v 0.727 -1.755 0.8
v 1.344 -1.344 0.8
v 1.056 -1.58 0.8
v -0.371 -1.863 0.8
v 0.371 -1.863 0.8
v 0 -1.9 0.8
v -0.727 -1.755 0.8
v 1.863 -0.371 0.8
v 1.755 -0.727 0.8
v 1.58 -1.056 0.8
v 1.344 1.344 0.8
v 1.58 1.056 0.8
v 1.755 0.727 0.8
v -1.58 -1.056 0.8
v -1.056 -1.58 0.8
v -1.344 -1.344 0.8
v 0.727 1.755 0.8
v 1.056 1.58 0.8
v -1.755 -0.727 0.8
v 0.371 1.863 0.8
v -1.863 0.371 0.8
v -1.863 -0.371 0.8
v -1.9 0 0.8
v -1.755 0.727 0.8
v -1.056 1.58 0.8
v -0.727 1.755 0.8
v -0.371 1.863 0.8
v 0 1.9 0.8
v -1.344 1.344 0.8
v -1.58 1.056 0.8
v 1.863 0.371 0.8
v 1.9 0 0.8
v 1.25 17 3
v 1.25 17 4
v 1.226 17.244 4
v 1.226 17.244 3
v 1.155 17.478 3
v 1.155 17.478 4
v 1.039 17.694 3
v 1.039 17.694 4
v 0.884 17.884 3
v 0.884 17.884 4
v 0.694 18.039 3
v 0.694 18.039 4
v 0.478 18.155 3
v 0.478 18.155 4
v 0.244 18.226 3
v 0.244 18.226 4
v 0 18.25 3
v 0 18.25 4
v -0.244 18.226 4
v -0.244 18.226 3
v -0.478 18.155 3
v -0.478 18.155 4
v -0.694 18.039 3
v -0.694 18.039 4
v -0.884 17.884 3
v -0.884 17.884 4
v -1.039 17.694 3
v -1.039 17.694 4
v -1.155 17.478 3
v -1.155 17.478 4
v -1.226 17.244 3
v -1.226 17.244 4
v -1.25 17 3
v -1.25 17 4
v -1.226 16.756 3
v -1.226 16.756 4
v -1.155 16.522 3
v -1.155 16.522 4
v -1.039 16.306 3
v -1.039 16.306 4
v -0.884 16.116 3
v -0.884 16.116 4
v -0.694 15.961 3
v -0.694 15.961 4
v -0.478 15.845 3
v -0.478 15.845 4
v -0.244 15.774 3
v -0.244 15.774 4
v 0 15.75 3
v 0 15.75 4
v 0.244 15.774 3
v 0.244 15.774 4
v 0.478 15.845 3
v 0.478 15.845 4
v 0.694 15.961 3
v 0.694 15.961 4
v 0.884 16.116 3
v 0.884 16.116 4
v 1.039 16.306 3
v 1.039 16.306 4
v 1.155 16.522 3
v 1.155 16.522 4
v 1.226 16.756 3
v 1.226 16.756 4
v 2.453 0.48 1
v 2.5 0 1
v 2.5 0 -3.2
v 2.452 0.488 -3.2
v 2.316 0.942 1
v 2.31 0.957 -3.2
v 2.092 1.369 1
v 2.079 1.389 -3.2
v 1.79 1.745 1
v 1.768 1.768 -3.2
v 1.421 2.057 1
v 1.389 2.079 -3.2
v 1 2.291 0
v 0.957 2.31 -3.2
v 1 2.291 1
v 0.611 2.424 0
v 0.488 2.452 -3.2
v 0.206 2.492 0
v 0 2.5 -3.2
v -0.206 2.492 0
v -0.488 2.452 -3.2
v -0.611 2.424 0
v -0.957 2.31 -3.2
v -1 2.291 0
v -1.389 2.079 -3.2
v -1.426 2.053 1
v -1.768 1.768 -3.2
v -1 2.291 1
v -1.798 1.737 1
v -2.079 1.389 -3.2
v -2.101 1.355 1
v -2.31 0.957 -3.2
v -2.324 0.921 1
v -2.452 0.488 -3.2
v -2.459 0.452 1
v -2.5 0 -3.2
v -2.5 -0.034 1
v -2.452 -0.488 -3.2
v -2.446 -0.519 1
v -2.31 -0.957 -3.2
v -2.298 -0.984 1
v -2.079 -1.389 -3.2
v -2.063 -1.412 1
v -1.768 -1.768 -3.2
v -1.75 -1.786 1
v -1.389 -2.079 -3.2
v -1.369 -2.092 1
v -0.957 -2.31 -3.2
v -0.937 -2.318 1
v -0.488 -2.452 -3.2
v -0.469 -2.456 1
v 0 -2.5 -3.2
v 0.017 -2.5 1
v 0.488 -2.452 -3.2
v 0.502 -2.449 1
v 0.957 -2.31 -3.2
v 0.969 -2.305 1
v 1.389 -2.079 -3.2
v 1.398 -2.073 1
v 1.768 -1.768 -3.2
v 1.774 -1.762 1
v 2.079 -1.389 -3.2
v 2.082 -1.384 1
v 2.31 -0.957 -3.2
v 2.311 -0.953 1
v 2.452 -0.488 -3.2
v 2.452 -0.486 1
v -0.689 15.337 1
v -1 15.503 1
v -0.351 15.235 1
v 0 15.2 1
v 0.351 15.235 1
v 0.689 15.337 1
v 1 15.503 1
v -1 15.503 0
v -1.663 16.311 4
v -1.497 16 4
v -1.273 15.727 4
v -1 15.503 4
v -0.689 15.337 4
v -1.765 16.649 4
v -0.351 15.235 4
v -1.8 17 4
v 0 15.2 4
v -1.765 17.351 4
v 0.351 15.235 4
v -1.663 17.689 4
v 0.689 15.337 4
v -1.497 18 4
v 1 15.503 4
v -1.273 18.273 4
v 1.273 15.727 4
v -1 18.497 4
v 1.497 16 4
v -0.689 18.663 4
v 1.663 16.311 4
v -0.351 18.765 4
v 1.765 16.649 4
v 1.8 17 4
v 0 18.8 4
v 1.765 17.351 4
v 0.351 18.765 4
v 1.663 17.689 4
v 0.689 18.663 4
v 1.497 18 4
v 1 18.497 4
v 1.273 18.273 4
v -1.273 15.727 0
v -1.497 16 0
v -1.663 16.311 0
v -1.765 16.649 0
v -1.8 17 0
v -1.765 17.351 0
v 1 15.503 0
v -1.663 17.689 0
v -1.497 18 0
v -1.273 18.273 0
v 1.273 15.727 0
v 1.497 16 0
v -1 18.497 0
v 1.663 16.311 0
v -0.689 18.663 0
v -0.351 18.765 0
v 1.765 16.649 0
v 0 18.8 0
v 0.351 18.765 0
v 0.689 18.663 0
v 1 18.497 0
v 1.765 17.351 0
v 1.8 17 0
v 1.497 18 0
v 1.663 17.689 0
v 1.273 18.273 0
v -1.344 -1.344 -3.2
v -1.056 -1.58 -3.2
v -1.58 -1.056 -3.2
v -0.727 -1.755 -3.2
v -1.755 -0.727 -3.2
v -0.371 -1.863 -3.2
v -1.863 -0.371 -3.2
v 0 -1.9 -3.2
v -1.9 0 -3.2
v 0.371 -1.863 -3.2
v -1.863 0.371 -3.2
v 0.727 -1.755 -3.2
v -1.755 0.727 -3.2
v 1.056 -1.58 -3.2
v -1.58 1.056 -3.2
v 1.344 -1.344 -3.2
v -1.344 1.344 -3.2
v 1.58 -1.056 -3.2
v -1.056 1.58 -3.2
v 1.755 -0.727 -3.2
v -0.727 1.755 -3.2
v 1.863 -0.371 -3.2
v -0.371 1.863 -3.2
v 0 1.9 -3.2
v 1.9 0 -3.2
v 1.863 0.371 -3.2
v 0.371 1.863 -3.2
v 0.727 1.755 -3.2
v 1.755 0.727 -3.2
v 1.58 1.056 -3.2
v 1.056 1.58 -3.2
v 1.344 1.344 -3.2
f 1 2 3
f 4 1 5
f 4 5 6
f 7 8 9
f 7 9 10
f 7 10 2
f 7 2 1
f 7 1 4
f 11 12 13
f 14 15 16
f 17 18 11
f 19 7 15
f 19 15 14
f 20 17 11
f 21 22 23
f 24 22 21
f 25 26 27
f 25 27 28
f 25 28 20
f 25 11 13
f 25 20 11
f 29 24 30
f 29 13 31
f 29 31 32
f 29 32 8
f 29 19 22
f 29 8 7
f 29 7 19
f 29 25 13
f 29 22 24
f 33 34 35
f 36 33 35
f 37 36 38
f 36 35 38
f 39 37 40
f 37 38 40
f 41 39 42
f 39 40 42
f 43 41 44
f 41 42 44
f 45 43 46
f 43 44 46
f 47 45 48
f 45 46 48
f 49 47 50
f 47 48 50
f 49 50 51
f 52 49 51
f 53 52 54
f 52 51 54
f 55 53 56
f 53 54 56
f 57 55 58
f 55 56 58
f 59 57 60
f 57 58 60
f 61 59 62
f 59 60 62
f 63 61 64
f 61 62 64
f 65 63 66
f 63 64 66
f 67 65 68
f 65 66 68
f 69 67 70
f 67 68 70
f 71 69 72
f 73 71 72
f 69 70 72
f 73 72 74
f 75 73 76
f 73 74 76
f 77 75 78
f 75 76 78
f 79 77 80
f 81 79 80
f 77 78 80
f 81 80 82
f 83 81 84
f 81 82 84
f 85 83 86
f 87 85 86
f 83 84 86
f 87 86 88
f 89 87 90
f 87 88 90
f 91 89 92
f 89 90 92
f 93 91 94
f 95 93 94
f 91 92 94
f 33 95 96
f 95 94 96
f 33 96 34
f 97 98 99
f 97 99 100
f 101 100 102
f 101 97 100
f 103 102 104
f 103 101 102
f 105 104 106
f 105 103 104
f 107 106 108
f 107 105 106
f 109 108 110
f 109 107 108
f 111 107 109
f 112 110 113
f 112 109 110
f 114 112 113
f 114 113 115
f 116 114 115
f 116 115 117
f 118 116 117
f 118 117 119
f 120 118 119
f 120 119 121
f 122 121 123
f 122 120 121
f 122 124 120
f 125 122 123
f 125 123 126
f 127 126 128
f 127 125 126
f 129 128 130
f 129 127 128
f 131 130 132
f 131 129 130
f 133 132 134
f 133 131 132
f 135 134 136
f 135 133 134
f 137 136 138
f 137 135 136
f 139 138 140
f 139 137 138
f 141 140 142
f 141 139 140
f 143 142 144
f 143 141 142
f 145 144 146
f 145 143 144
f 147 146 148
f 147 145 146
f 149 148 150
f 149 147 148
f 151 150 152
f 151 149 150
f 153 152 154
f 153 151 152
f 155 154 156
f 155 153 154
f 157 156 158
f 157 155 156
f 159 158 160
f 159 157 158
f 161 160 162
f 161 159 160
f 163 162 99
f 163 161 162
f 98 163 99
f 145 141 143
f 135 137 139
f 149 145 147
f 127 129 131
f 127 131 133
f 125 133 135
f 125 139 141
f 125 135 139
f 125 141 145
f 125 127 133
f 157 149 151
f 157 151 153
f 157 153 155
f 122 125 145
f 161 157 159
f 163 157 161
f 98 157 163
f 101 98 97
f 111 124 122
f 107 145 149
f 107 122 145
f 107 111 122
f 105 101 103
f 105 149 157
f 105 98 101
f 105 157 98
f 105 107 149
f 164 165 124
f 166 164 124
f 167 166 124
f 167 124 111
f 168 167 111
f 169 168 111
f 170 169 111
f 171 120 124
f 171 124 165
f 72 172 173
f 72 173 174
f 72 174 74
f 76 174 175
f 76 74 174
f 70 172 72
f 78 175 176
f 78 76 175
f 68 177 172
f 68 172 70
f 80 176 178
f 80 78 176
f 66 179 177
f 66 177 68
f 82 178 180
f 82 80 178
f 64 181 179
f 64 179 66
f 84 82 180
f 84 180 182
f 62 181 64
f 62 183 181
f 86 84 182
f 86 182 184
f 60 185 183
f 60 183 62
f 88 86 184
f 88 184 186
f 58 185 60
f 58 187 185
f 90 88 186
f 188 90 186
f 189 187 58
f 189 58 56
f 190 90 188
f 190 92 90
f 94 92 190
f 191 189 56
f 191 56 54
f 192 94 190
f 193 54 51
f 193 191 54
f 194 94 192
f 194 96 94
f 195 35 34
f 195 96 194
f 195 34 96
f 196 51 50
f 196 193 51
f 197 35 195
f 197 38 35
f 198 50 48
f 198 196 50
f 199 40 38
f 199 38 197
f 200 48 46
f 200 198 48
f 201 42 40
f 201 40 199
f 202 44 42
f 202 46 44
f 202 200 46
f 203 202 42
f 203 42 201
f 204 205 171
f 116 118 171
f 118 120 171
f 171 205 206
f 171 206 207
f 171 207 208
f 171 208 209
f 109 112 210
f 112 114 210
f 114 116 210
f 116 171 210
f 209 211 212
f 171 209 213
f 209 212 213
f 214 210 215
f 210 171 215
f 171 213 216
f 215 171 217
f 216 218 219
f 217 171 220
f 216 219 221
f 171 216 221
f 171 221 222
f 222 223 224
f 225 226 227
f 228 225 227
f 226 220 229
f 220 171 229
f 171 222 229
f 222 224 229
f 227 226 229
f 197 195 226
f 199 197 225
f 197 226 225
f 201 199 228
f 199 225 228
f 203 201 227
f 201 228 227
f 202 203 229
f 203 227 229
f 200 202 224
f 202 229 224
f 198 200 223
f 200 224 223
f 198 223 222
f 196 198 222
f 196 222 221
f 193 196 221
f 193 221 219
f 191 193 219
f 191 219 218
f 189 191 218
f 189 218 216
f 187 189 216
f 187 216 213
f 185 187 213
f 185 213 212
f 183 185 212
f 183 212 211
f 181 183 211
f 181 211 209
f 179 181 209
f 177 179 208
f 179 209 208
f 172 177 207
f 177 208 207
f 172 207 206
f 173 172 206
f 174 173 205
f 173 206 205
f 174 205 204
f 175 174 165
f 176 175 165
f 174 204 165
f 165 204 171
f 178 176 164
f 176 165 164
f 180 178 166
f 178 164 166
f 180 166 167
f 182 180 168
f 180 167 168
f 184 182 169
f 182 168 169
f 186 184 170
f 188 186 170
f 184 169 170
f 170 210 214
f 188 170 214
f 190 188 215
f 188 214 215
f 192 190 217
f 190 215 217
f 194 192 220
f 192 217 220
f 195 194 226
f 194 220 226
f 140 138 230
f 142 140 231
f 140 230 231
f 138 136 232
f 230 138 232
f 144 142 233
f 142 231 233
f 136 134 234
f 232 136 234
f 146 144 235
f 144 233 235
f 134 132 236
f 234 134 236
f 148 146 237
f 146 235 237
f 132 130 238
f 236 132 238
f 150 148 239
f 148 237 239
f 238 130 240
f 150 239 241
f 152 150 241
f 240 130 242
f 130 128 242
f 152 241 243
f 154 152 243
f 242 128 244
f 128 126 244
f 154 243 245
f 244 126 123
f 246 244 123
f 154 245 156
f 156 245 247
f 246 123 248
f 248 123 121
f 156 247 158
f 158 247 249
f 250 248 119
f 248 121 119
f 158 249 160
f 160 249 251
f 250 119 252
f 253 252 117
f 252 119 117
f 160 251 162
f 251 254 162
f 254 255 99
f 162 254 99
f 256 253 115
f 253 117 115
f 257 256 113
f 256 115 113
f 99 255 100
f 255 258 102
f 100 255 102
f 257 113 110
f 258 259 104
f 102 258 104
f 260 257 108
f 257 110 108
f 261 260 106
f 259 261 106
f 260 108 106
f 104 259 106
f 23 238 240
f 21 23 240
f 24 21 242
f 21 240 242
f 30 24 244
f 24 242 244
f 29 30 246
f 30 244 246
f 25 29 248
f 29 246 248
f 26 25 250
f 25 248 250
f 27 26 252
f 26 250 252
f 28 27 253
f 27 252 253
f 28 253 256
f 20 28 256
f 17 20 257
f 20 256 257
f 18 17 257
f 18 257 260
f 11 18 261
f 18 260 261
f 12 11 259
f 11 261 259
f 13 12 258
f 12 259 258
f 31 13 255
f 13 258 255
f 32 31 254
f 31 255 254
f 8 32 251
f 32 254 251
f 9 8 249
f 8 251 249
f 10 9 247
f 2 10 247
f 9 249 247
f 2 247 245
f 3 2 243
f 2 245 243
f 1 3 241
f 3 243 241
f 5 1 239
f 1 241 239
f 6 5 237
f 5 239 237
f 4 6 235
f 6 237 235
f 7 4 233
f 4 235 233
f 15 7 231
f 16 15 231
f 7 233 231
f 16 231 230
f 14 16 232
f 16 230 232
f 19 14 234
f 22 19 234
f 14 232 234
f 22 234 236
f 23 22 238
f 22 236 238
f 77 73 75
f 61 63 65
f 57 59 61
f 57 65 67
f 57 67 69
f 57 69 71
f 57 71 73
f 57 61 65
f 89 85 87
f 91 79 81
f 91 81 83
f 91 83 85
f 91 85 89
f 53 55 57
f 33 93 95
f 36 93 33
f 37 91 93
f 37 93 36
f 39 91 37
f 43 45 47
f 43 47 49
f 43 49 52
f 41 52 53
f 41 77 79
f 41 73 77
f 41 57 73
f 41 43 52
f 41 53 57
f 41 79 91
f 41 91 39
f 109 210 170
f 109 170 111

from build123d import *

# Parameters (mm, degrees)
EXTRUDE_1_DEPTH     = 1
SKETCH_2_R          = 1.8
EXTRUDE_2_DEPTH     = 4
SKETCH_3_R          = 1.25
CUT_EXTRUDE_1_DEPTH = 1
SKETCH_4_R          = 2.5
EXTRUDE_3_DEPTH     = 4.2
SKETCH_5_R          = 1.9
CUT_EXTRUDE_2_DEPTH = 4


with BuildPart() as part:
    # 草图1 → 凸台-拉伸1 (new body)
    with BuildSketch(Plane.XY):
        with BuildLine():
            Line((-1, 0), (-1, 17))
            ThreePointArc((-1, 17), (0, 18), (1, 17))
            Line((1, 17), (1, 0))
            ThreePointArc((1, 0), (0, -1), (-1, 0))
        make_face()
    extrude(amount=EXTRUDE_1_DEPTH)

    # 草图2 → 凸台-拉伸2 (add)
    with BuildSketch(Plane.XY):
        with Locations((0, 17)):
            Circle(SKETCH_2_R)
    extrude(amount=EXTRUDE_2_DEPTH)

    # 草图3 → 切除-拉伸1 (cut)
    with BuildSketch(Plane.XY.offset(4)):
        with Locations((0, 17)):
            Circle(SKETCH_3_R)
    extrude(amount=-CUT_EXTRUDE_1_DEPTH, mode=Mode.SUBTRACT)

    # 草图4 → 凸台-拉伸3 (add)
    with BuildSketch(Plane.XY.offset(1)):
        Circle(SKETCH_4_R)
    extrude(amount=-EXTRUDE_3_DEPTH)

    # 草图5 → 切除-拉伸2 (cut)
    with BuildSketch(Plane(origin=(0, 0, -3.2), x_dir=(-1, 0, 0), z_dir=(0, 0, -1))):
        Circle(SKETCH_5_R)
    extrude(amount=-CUT_EXTRUDE_2_DEPTH, mode=Mode.SUBTRACT)


solid = part.part
